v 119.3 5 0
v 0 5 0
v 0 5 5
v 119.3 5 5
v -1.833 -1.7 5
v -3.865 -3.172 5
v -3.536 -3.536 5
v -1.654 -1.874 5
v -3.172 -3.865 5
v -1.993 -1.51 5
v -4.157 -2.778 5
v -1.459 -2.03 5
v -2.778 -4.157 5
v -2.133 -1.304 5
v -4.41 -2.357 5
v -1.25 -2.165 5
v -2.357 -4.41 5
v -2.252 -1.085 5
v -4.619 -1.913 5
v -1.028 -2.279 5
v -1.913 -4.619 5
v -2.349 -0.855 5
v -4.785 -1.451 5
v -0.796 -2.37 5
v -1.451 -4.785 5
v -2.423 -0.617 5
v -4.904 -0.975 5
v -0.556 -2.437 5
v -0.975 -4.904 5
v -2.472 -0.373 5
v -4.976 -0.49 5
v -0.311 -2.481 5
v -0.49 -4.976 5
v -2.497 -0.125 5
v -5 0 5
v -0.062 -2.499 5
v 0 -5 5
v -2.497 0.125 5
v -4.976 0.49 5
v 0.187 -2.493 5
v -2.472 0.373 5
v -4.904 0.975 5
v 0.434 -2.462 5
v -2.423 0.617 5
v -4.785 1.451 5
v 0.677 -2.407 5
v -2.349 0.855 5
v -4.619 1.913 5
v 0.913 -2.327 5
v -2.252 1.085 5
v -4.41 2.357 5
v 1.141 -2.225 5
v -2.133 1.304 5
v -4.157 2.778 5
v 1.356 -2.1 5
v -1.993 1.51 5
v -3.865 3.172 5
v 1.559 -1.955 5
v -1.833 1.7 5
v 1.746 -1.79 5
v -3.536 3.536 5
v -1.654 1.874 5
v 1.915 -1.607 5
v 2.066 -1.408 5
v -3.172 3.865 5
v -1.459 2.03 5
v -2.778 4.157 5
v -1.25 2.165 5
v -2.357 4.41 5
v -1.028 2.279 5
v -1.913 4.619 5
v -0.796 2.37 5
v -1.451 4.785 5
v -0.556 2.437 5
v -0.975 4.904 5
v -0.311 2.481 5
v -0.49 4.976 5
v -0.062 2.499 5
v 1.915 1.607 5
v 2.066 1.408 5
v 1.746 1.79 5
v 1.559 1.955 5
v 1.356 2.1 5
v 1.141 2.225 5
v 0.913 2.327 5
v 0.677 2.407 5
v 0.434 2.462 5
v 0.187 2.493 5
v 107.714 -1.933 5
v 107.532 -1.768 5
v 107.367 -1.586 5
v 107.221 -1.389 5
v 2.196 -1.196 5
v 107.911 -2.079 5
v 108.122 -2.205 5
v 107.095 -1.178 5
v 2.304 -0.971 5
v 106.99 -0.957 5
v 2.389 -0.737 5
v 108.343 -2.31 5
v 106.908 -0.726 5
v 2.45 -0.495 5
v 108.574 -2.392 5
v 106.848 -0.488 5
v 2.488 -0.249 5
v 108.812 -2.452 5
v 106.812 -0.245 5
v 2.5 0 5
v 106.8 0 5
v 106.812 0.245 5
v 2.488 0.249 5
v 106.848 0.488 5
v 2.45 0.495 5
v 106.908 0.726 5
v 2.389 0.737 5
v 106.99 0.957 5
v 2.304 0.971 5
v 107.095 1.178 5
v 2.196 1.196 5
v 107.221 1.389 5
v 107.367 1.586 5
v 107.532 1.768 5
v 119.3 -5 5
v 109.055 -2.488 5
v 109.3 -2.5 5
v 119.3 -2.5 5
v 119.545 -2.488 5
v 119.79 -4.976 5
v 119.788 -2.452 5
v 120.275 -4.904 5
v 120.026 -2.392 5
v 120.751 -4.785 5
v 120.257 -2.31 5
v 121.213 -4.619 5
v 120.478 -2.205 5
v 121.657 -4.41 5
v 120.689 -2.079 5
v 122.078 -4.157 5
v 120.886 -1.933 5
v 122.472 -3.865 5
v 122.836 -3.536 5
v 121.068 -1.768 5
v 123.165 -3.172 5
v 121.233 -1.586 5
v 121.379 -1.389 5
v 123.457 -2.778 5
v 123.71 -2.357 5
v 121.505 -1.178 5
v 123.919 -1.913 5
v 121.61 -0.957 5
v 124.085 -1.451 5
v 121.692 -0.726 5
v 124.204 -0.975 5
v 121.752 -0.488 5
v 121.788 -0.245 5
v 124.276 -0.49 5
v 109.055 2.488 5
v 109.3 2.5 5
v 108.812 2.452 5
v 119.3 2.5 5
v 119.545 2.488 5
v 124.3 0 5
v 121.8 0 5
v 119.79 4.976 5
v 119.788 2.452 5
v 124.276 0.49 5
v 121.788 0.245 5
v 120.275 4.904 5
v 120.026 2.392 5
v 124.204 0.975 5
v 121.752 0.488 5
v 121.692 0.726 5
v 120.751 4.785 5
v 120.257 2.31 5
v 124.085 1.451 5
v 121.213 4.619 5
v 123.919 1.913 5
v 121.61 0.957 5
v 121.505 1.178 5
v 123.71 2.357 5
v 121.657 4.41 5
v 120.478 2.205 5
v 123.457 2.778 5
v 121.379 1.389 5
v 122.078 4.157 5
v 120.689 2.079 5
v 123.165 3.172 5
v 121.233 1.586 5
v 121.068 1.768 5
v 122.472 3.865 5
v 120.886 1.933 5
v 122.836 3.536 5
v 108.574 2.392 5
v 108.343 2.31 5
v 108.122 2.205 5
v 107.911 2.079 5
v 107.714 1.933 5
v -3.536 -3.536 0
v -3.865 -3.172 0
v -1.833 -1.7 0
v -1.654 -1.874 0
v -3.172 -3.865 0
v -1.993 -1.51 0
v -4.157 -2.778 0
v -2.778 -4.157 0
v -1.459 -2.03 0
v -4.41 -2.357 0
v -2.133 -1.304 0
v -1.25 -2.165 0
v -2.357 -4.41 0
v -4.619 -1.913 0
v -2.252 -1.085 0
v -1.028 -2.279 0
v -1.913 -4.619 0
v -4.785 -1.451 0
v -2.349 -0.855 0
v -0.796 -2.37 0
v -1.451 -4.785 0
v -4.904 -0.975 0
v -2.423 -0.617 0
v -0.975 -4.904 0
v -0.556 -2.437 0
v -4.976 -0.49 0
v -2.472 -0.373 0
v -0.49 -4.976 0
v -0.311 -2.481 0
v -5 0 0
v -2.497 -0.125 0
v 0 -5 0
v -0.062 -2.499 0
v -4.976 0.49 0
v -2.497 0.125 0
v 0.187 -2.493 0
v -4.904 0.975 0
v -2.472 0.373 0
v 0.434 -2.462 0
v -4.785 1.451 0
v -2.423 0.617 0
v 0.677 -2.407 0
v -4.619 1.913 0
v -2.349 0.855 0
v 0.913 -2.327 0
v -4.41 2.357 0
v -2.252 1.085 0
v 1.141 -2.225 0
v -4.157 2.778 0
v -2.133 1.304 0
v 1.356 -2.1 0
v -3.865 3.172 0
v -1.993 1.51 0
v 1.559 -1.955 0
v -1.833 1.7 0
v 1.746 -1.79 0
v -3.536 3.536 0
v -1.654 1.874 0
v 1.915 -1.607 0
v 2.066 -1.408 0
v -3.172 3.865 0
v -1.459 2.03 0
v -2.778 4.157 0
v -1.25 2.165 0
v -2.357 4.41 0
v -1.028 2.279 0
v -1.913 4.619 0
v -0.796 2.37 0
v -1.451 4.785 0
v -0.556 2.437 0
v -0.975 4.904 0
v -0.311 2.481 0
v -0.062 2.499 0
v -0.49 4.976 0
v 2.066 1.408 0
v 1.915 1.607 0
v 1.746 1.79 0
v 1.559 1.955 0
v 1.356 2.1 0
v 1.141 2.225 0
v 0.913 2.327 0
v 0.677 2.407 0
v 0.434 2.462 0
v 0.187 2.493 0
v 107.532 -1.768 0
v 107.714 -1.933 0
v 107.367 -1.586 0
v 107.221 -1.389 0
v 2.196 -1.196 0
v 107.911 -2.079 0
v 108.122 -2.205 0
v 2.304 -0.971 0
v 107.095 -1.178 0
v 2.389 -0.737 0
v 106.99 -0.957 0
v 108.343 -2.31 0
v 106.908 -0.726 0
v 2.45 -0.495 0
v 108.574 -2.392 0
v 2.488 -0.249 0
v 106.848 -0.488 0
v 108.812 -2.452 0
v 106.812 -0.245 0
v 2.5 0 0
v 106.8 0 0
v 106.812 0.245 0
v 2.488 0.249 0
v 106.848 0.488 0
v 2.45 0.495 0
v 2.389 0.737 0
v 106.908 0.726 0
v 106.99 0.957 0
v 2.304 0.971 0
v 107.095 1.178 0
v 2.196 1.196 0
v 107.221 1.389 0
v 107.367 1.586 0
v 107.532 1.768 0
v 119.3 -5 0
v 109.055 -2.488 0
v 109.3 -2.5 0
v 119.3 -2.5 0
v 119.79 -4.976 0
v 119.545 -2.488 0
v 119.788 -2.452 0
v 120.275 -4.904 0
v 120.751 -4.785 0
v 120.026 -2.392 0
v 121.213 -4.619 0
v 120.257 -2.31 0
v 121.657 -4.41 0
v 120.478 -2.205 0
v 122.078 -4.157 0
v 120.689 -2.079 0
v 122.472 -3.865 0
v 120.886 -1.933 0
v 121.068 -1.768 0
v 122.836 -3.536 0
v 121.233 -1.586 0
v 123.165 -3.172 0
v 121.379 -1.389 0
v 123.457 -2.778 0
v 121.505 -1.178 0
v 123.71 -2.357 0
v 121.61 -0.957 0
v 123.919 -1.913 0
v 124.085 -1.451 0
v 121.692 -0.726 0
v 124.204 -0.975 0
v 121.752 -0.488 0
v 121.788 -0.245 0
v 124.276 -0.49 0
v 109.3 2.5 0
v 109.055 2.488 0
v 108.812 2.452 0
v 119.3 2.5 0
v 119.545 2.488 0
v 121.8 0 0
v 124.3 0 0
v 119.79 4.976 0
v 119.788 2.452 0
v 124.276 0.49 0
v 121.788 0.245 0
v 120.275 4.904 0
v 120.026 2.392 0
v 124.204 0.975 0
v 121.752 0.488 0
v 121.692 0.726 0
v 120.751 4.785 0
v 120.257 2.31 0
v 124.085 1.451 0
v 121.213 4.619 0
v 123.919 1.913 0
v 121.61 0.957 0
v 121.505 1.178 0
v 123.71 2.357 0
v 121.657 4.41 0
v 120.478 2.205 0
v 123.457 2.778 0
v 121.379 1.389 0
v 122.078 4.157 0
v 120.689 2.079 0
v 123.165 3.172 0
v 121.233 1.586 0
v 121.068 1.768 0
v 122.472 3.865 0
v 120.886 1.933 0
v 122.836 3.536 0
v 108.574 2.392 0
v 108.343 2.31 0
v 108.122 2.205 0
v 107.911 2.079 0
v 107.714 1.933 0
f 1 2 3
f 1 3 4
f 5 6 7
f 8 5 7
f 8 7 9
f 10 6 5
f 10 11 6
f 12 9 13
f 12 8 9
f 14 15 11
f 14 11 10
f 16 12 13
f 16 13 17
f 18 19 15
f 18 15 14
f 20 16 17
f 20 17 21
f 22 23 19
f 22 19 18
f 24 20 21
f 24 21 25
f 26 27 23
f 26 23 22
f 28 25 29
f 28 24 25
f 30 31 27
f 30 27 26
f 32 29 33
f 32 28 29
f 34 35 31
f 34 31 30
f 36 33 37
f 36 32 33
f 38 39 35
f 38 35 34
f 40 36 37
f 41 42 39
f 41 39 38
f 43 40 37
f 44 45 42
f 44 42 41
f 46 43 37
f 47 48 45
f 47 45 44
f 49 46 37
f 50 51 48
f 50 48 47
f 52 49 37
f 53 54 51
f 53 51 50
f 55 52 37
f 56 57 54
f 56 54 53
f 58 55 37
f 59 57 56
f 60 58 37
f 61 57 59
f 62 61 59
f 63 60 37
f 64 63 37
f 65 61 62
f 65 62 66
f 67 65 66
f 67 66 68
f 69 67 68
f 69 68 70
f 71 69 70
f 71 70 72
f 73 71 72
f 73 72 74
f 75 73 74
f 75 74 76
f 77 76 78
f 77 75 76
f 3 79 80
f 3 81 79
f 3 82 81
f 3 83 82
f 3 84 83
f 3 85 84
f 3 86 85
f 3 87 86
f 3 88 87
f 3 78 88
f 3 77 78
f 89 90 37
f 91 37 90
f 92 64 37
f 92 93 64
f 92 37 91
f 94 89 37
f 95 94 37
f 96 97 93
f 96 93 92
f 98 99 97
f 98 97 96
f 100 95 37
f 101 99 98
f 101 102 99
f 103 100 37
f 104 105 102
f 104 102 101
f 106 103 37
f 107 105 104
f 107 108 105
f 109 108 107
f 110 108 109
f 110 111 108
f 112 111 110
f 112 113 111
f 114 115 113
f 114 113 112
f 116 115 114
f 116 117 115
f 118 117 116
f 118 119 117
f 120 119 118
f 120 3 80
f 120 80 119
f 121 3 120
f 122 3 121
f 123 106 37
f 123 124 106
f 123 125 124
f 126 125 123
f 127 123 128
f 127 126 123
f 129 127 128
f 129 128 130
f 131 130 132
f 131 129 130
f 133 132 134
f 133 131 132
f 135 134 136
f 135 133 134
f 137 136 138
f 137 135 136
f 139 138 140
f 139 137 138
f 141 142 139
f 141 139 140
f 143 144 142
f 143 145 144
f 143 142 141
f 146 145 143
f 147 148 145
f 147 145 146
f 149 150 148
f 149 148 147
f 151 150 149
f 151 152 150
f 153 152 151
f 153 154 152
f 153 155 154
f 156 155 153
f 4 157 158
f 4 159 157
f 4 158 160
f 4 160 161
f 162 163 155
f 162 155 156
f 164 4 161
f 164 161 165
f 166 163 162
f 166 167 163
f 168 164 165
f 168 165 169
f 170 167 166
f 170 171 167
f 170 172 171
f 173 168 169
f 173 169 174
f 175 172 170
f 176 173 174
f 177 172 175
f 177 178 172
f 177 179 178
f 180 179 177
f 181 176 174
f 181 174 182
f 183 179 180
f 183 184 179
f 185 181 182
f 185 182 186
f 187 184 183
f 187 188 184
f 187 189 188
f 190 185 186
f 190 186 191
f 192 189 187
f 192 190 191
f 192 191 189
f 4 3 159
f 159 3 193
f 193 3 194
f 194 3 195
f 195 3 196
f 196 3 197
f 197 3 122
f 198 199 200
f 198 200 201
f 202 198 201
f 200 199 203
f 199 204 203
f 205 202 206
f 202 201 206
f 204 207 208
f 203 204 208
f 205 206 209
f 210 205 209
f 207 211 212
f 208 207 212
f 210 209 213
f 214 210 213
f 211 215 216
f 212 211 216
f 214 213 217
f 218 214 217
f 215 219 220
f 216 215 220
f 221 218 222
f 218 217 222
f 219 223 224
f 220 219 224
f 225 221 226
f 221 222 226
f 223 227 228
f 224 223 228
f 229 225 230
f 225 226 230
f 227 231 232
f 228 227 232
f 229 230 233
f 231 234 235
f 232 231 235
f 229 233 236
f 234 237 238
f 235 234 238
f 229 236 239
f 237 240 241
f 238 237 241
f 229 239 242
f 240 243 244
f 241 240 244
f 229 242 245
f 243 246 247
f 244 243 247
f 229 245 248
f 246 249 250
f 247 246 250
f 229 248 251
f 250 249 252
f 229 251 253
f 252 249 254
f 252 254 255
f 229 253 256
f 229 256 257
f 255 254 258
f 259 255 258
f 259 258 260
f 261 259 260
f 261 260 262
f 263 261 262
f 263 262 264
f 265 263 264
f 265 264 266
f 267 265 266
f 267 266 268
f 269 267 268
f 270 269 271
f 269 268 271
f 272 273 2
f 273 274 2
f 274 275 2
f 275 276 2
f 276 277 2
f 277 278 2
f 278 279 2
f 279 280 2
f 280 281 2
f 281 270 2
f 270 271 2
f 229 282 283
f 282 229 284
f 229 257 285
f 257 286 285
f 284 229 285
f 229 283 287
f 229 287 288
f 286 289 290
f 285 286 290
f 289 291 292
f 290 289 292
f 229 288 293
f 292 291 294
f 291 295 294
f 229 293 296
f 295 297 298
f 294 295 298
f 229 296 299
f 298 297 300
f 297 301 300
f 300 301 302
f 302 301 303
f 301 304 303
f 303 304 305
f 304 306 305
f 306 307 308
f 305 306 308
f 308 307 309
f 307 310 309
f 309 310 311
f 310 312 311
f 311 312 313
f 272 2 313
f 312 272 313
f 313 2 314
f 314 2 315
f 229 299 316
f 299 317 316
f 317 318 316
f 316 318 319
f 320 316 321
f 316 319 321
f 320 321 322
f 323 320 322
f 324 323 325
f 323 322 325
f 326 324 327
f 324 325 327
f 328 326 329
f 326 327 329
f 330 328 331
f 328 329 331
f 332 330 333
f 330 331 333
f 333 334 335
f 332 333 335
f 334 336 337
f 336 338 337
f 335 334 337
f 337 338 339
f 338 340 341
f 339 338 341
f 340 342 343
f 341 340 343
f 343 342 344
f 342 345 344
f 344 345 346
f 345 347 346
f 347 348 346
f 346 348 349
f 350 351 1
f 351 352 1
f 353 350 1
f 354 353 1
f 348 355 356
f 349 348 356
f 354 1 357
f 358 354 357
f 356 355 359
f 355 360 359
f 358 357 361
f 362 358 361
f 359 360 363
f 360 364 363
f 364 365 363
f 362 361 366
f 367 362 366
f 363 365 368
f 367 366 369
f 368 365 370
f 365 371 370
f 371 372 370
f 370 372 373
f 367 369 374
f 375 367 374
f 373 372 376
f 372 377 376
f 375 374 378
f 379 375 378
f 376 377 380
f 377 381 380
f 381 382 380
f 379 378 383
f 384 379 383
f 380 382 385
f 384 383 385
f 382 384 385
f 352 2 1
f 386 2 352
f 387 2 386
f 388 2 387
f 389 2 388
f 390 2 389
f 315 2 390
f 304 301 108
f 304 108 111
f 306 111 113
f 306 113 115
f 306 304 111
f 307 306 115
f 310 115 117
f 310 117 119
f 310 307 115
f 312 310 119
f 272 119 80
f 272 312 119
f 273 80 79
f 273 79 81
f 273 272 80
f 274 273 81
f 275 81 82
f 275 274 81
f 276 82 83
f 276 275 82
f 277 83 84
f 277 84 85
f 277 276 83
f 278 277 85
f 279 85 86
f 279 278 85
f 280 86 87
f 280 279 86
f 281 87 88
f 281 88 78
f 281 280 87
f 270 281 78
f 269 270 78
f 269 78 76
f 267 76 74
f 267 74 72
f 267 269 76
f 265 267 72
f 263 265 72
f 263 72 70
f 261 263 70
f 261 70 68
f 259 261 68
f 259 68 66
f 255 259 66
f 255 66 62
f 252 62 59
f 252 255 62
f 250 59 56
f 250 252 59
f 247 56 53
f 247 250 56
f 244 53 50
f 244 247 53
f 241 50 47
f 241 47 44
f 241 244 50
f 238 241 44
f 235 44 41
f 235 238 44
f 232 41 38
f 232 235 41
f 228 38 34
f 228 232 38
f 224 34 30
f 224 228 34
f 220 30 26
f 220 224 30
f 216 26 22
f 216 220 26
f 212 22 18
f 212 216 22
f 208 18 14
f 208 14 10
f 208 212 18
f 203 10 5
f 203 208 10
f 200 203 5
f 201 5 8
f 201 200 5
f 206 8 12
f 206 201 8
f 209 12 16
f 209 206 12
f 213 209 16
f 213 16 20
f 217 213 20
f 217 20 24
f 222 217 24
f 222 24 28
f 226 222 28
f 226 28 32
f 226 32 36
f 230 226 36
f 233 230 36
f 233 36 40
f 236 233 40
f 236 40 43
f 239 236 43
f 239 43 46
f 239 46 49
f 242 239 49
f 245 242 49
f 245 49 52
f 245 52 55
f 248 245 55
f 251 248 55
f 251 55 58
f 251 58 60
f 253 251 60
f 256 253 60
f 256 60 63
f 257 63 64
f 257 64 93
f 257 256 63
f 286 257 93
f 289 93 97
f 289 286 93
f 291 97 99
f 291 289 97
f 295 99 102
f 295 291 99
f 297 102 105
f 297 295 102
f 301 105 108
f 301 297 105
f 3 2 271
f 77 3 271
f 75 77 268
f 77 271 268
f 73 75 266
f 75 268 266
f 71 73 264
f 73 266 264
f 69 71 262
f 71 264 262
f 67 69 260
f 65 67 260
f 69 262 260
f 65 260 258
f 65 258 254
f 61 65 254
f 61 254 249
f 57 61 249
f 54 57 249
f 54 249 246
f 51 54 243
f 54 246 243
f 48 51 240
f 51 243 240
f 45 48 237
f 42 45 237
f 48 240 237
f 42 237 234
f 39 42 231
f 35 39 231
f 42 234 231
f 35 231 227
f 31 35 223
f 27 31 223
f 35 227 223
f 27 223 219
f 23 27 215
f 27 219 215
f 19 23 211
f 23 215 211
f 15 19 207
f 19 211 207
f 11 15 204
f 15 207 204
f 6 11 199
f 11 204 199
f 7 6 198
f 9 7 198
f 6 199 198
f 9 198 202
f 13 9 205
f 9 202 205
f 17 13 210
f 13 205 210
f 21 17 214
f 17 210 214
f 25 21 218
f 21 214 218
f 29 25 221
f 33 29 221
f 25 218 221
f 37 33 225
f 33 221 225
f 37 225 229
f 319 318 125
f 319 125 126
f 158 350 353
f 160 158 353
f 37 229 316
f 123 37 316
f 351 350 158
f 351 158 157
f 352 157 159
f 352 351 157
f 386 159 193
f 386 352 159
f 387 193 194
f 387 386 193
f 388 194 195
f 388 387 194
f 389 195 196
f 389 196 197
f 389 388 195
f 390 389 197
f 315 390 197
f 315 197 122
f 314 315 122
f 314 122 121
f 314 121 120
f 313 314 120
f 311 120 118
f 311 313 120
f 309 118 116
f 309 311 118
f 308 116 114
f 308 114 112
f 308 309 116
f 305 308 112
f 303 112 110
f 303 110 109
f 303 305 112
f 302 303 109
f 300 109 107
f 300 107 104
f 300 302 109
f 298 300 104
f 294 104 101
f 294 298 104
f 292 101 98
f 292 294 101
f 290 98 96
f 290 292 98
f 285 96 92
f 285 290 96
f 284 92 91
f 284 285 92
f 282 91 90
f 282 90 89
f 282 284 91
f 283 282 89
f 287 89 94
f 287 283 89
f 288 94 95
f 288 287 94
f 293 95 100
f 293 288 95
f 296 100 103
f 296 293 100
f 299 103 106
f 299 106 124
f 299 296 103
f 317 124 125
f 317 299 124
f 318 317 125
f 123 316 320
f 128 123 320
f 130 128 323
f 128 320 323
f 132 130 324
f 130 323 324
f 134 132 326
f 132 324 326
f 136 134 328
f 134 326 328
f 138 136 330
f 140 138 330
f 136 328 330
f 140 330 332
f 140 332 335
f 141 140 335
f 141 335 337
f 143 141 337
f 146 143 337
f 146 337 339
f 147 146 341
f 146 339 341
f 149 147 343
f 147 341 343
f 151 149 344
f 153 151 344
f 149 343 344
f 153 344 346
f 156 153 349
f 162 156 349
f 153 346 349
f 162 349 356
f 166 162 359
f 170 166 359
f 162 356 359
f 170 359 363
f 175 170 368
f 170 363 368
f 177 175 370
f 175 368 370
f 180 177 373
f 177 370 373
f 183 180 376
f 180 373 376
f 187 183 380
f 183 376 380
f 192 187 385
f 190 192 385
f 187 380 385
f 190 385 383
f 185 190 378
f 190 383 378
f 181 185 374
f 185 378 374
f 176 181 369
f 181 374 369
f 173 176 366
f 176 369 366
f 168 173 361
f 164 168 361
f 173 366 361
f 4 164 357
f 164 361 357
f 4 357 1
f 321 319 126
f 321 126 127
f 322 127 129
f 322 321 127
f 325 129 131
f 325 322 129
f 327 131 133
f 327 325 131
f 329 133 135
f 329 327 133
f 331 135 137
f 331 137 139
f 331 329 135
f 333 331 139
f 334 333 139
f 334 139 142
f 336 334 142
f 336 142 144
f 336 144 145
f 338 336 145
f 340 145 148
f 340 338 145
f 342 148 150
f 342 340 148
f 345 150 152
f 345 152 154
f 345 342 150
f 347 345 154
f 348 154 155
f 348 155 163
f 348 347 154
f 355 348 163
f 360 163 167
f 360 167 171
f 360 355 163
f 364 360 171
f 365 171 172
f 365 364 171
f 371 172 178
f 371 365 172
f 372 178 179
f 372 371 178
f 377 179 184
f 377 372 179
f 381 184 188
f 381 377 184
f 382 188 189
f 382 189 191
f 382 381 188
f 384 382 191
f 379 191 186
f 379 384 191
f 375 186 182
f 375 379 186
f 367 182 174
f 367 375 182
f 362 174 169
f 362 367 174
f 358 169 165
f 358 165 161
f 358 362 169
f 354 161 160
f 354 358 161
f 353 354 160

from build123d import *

# Parameters (mm, degrees)
SKETCH_R  = 2.5
PAD_DEPTH = 5


with BuildPart() as part:
    # Sketch → Pad (new body)
    with BuildSketch(Plane.XY):
        with BuildLine():
            ThreePointArc((0, 5), (-5, 0), (0, -5))
            Line((0, -5), (119.3, -5))
            ThreePointArc((119.3, -5), (124.3, 0), (119.3, 5))
            Line((0, 5), (119.3, 5))
        make_face()
        Circle(SKETCH_R, mode=Mode.SUBTRACT)
        with BuildLine():
            ThreePointArc((109.3, 2.5), (106.8, 0), (109.3, -2.5))
            Line((109.3, -2.5), (119.3, -2.5))
            ThreePointArc((119.3, -2.5), (121.8, 0), (119.3, 2.5))
            Line((109.3, 2.5), (119.3, 2.5))
        make_face(mode=Mode.SUBTRACT)
    extrude(amount=PAD_DEPTH)


solid = part.part
